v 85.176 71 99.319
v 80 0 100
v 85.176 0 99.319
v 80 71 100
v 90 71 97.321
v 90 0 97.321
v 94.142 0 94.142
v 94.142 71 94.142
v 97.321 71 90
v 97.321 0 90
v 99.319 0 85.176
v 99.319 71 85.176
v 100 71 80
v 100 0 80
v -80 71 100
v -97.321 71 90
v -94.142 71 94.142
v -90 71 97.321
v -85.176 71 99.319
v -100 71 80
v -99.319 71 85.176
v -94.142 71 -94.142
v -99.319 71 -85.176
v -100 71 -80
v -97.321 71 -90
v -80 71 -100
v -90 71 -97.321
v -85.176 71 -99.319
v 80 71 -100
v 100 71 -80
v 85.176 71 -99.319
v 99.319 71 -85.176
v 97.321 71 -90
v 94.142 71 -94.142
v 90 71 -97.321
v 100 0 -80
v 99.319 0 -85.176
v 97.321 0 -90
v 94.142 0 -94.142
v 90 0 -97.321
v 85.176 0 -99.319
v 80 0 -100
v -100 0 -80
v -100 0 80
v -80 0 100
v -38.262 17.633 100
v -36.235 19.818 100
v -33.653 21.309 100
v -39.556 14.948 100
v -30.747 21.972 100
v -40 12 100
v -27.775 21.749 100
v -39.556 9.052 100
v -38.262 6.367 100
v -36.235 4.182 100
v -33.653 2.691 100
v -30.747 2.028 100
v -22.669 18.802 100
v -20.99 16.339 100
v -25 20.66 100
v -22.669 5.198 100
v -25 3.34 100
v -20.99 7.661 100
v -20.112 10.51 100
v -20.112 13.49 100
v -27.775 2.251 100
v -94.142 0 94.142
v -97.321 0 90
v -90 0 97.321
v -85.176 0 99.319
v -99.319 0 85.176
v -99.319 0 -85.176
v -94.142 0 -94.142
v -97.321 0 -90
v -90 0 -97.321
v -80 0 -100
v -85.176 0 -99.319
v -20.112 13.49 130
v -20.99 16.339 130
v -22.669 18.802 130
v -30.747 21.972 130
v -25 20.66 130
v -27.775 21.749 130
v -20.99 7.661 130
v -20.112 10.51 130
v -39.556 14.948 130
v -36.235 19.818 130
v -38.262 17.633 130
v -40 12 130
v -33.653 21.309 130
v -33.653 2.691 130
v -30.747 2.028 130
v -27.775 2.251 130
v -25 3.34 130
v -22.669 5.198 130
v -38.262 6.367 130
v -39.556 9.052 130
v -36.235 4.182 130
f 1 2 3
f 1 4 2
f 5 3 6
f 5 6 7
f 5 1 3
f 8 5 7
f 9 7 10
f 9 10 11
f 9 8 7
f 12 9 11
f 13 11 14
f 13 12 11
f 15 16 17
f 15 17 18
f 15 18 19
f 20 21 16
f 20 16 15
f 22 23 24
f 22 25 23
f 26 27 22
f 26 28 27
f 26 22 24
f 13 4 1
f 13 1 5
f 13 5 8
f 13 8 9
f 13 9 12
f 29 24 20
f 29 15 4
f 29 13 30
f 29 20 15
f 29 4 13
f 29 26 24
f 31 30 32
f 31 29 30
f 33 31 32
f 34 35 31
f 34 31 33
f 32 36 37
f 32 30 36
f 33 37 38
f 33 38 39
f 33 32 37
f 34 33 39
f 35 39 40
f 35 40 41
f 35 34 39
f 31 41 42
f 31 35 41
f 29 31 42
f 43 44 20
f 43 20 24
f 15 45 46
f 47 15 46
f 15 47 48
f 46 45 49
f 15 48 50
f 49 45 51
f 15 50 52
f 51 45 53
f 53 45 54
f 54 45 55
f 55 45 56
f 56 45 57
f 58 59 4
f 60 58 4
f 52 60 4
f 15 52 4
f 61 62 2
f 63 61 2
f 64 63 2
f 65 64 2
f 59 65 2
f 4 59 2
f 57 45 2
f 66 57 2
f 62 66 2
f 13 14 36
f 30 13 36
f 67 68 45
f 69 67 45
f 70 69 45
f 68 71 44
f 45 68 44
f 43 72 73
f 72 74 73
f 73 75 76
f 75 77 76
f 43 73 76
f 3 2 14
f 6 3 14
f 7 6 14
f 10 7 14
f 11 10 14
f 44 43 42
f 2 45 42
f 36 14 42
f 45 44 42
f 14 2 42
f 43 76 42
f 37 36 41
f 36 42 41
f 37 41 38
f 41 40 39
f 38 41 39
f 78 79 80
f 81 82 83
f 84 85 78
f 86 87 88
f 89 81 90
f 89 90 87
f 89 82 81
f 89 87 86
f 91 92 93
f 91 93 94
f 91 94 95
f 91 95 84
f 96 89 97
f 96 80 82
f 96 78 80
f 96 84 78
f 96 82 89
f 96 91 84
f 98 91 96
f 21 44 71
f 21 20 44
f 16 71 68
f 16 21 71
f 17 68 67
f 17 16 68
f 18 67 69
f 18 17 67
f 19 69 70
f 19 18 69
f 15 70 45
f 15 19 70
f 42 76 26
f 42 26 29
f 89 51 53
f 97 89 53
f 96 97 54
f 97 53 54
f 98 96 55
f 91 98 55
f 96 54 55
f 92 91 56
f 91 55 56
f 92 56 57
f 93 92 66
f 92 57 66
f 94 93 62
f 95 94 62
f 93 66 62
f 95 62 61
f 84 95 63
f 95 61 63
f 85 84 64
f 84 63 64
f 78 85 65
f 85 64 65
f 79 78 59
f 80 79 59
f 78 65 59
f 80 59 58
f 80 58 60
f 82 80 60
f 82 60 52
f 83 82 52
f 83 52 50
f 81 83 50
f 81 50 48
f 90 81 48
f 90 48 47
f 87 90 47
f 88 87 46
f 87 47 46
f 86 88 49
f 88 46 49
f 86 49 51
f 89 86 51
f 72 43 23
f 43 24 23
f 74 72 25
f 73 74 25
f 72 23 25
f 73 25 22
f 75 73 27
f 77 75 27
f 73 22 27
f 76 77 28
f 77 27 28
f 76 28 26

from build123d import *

# Parameters (mm, degrees)
SKETCH1_W           = 200
SKETCH1_H           = 200
BOSS_EXTRUDE1_DEPTH = 71
FILLET1_R           = 20
SKETCH2_R           = 10
BOSS_EXTRUDE2_DEPTH = 30


with BuildPart() as part:
    # Sketch1 → Boss-Extrude1 (new body)
    with BuildSketch(Plane(origin=(0, 0, 0), x_dir=(1, 0, 0), z_dir=(0, 1, 0))):
        Rectangle(SKETCH1_W, SKETCH1_H)
    extrude(amount=BOSS_EXTRUDE1_DEPTH)

    # Fillet1
    fillet1_edges = [part.edges().sort_by_distance(p)[0] for p in [
        (100, 35.5, 100),
        (-100, 35.5, 100),
        (-100, 35.5, -100),
        (100, 35.5, -100),
    ]]
    fillet(fillet1_edges, radius=FILLET1_R)

    # Sketch2 → Boss-Extrude2 (add)
    with BuildSketch(Plane.XY.offset(100)):
        with Locations(Location((-30, 12, 0), (0, 0, 180))):
            Circle(SKETCH2_R)
    extrude(amount=BOSS_EXTRUDE2_DEPTH)


solid = part.part
